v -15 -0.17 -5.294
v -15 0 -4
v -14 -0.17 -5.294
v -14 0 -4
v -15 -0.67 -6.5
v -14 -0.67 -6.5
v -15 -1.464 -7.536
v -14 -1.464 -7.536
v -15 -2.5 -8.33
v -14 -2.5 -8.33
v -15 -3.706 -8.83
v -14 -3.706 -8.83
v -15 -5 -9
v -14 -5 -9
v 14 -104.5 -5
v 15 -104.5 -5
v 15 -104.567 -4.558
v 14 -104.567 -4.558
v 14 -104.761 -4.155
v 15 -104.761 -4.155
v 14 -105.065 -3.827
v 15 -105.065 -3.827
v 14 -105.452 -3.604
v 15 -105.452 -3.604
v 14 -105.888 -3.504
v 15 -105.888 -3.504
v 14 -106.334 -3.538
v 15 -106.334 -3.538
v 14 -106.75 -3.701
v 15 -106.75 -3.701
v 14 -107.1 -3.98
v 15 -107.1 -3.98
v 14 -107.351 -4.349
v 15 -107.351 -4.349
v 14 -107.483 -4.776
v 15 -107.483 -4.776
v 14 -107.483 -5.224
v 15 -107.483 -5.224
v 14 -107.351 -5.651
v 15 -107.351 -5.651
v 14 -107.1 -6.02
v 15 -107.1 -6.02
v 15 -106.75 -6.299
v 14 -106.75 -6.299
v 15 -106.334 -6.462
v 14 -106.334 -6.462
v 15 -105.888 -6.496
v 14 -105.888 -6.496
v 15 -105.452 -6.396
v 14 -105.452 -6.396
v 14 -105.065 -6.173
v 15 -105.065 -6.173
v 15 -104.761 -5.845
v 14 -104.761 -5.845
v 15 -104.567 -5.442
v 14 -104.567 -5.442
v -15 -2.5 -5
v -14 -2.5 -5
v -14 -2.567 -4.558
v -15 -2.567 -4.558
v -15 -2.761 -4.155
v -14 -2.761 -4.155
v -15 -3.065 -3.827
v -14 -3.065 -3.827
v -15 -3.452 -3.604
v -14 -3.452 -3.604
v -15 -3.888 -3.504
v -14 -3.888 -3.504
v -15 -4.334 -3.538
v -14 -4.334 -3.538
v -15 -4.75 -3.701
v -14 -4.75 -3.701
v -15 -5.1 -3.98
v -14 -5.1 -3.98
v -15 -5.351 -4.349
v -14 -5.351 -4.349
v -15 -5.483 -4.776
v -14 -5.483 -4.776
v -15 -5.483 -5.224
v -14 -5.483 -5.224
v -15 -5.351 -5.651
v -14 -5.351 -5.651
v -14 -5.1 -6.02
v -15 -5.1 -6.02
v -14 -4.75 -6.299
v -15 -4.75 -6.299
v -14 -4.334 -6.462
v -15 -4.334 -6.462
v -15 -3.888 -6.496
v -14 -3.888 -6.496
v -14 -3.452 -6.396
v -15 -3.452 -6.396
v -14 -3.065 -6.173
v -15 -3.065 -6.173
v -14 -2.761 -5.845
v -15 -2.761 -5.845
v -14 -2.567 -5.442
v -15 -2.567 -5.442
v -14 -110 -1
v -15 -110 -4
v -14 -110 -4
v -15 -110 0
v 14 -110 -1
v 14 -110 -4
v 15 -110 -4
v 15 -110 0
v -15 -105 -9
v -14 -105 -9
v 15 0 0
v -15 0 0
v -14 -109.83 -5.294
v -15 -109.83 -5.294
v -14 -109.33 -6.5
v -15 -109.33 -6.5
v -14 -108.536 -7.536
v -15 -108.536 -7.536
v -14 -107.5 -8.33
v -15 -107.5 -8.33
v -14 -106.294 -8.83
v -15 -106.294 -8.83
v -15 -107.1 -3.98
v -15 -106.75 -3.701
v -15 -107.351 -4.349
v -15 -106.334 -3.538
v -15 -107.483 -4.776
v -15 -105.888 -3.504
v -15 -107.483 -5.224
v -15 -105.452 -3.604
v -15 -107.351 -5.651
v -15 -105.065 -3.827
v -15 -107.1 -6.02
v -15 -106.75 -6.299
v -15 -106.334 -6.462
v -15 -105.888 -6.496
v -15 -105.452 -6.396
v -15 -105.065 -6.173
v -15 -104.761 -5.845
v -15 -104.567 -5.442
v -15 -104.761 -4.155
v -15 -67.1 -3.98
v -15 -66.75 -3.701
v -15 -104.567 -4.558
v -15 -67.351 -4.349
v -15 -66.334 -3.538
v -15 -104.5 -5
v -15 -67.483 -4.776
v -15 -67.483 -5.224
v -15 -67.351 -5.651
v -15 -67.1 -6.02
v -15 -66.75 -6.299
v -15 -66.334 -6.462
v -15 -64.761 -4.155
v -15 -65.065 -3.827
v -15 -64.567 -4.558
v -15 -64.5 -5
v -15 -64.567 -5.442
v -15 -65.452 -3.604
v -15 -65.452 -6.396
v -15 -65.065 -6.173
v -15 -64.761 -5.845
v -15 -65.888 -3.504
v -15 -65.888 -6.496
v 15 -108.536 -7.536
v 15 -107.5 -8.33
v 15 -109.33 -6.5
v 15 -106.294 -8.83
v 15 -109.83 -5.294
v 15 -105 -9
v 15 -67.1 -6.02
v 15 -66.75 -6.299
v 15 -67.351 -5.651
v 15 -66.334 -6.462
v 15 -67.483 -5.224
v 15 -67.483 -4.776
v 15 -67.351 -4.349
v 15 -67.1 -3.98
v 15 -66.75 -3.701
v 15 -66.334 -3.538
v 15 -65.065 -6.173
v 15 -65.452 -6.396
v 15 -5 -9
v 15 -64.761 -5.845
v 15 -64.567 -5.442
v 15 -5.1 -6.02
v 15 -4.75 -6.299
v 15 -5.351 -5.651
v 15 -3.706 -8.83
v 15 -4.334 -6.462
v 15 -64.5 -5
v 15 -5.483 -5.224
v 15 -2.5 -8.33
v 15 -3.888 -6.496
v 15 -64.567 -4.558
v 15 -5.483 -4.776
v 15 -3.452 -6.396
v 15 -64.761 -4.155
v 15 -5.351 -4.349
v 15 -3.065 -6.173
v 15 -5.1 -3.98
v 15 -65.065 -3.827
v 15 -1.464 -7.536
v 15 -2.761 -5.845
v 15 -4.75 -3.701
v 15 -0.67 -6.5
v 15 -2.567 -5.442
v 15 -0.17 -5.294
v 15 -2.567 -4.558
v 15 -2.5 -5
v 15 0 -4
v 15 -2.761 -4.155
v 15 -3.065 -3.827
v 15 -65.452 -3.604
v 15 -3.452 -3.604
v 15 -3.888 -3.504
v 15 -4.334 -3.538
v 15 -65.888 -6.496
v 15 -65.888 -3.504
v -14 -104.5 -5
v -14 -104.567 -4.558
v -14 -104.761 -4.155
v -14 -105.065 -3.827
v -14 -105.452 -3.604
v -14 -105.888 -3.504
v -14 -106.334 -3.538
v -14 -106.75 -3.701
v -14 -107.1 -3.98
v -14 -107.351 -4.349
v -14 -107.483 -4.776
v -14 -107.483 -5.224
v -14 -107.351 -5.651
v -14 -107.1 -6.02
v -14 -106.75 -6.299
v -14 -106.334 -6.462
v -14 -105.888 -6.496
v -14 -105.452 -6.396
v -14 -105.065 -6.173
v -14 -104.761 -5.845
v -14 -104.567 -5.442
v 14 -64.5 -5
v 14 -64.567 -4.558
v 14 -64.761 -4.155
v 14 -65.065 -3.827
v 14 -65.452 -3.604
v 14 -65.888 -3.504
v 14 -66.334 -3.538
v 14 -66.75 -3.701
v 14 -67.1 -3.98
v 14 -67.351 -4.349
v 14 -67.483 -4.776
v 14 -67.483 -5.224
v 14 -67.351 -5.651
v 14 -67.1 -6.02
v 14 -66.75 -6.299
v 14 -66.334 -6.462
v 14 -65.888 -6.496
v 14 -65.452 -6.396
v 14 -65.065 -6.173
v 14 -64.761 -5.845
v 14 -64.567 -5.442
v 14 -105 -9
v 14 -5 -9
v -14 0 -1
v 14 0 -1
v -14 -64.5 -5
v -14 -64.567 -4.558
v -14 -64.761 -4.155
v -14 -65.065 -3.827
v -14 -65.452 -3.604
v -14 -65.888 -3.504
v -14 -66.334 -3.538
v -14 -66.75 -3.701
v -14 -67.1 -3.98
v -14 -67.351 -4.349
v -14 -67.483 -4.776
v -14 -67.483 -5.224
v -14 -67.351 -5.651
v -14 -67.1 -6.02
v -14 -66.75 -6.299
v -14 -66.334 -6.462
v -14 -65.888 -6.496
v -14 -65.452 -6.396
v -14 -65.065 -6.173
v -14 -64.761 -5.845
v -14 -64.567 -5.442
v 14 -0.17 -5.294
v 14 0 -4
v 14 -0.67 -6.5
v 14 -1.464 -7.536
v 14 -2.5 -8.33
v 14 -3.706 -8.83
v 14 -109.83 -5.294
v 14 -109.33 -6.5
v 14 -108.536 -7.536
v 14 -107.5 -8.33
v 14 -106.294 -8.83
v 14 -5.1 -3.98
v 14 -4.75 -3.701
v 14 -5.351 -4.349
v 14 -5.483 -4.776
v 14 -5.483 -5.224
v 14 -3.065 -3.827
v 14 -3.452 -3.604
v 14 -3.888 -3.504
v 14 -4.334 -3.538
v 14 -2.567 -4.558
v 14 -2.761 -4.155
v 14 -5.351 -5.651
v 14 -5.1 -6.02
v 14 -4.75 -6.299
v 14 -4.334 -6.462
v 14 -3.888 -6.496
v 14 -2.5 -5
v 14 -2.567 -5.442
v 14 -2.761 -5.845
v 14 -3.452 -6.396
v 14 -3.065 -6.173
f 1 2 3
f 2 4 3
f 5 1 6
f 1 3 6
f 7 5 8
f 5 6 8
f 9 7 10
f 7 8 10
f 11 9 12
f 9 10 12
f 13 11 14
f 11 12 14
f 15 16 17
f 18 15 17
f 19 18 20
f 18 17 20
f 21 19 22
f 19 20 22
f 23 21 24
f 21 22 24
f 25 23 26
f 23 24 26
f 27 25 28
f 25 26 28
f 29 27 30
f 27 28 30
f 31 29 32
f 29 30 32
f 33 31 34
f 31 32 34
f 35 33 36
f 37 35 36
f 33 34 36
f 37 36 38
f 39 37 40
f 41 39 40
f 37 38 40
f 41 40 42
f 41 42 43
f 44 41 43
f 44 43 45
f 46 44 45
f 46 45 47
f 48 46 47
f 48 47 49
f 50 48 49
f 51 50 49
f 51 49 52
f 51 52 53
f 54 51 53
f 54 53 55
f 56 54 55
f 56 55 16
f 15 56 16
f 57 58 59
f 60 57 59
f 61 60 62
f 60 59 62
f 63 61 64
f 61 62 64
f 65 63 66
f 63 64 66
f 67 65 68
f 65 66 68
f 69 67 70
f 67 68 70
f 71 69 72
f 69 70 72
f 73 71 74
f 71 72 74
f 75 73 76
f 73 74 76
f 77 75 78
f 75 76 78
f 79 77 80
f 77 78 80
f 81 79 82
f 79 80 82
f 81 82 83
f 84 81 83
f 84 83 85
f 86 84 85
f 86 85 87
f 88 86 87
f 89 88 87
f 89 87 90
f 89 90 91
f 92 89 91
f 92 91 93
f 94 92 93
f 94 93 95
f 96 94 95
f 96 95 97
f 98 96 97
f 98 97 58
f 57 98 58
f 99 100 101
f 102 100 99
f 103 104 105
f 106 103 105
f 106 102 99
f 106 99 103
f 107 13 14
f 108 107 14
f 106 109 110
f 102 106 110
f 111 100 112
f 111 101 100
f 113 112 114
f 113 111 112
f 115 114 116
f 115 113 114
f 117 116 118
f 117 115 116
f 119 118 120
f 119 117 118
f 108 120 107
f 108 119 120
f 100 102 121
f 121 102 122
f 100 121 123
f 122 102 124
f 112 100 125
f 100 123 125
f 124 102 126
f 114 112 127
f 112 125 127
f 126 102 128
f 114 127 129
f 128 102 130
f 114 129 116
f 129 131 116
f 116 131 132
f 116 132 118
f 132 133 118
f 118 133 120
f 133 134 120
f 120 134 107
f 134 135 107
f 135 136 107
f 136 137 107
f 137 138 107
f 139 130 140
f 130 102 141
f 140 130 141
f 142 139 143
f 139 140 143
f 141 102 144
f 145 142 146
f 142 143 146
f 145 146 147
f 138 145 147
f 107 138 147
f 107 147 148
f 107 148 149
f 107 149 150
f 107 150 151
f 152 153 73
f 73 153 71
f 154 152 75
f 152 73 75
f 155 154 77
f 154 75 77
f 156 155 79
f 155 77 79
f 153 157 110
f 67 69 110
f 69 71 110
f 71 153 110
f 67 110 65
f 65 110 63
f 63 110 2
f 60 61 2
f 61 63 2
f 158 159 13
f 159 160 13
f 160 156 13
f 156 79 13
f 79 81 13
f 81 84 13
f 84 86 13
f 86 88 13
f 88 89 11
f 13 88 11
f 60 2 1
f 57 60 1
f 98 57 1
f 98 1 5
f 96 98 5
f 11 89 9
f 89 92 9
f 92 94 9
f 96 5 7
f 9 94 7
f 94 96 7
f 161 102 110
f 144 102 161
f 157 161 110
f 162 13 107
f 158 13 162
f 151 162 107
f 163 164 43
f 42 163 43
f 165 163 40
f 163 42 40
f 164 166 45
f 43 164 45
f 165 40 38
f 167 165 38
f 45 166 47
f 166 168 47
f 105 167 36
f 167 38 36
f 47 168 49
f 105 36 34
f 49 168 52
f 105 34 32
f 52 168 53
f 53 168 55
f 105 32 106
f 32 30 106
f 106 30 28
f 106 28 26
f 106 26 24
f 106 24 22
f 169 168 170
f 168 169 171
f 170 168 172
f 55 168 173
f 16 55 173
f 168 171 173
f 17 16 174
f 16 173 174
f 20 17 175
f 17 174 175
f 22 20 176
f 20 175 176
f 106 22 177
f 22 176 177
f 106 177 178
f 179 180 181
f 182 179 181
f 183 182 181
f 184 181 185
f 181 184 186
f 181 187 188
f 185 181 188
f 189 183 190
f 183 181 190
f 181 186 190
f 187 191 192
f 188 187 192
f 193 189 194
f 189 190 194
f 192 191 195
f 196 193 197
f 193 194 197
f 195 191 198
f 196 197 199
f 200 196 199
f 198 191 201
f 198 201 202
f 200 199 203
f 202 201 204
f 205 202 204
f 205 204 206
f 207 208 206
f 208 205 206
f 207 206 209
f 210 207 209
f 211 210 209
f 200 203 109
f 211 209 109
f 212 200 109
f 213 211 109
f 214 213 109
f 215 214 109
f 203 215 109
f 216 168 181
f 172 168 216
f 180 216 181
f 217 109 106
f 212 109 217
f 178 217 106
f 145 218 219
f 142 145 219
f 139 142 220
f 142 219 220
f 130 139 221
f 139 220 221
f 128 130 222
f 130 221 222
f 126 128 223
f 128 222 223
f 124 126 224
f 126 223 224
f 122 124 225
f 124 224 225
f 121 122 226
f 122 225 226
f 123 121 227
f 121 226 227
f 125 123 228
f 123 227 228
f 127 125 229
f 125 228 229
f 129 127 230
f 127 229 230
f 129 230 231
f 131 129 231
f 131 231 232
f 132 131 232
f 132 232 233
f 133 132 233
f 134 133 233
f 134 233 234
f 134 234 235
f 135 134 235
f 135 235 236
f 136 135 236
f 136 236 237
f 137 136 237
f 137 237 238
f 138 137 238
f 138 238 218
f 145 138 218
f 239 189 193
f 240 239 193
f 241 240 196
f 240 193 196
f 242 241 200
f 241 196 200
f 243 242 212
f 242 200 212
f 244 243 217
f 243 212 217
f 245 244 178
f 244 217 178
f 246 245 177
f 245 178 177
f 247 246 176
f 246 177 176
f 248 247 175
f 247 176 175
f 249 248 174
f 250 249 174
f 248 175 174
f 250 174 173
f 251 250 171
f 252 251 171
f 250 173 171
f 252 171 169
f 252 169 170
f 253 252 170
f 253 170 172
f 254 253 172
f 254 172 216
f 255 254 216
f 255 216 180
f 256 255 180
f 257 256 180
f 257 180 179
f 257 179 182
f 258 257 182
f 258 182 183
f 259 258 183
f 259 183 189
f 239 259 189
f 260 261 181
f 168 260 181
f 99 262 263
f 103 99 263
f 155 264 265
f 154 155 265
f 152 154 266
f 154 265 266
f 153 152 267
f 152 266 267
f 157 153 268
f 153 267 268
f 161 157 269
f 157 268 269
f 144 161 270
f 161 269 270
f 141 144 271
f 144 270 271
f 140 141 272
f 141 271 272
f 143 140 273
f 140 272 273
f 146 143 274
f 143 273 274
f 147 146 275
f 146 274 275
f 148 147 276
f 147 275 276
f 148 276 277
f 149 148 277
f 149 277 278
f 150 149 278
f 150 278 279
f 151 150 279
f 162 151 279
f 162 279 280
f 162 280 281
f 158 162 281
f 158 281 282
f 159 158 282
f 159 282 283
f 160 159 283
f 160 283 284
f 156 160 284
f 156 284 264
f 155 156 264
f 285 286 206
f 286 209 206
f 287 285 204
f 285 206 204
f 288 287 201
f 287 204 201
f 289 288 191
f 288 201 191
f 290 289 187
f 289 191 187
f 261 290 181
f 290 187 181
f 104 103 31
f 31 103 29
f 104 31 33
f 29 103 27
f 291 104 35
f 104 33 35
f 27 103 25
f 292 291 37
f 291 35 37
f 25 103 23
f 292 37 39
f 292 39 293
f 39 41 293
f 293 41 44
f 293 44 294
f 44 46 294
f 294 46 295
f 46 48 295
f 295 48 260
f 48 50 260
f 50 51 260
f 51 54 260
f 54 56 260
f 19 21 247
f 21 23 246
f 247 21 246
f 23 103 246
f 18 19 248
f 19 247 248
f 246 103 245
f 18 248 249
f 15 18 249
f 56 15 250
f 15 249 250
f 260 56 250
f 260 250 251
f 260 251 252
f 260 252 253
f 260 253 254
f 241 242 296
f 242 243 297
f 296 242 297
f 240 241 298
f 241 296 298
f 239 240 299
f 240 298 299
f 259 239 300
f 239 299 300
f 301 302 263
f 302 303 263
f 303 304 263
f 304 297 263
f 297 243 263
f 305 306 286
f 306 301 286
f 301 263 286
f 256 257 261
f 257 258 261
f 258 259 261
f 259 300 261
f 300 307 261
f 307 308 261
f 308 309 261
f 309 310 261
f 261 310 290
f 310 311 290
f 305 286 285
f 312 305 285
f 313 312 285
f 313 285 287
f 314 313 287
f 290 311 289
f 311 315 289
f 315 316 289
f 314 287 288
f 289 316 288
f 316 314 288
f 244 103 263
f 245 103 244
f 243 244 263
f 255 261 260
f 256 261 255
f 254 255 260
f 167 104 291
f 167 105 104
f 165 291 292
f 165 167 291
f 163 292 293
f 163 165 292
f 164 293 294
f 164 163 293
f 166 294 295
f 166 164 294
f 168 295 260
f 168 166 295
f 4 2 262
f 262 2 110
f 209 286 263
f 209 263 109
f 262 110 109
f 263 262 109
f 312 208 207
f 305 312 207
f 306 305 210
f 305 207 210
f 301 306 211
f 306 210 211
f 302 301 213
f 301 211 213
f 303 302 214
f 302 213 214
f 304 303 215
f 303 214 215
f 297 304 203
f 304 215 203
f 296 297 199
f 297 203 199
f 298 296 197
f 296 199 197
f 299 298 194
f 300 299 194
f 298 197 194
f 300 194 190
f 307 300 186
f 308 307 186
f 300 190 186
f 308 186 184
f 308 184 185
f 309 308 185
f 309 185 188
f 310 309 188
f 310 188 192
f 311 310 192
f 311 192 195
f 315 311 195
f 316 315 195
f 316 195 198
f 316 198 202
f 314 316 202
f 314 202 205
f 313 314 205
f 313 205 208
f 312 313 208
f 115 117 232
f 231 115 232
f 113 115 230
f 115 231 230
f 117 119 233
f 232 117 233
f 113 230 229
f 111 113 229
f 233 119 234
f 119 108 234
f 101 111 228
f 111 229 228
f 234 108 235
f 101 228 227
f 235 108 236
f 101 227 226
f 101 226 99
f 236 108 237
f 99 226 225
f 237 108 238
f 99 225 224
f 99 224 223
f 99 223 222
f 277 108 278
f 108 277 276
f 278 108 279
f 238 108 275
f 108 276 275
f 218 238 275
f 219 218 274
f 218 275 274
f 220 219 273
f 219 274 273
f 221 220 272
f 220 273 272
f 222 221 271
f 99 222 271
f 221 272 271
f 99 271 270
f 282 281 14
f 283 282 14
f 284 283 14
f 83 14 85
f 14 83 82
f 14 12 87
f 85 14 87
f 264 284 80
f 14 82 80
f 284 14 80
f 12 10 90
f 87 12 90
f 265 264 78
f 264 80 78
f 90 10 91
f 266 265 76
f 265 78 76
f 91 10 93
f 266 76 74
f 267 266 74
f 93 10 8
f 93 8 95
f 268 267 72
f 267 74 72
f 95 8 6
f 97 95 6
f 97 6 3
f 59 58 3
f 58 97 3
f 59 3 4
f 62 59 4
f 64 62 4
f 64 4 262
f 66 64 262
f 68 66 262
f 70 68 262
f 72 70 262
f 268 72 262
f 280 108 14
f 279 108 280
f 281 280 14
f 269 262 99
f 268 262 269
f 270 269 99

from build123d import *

# Parameters (mm, degrees)
F1_DEPTH = 110
F2_R     = 1.5
F3_DEPTH = 35
F4_R     = 5


with BuildPart() as f1:
    # F0 (on Front) → F1 (new body)
    with BuildSketch(Plane.XZ):
        Polygon((15, 0), (-15, 0), (-15, -9), (-14, -9), (-14, -1), (14, -1), (14, -9), (15, -9), align=None)
    extrude(amount=F1_DEPTH)

    # F2 (on face) → F3 (cut)
    with BuildSketch(Plane.YZ.offset(15)):
        with Locations((-106, -5)):
            Circle(F2_R)
        with Locations((-66, -5)):
            Circle(F2_R)
        with Locations((-4, -5)):
            Circle(F2_R)
    extrude(amount=-F3_DEPTH, mode=Mode.SUBTRACT)

    # F4
    f4_edges = [f1.edges().sort_by_distance(p)[0] for p in [
        (14.5, -110, -9),
        (-14.5, -110, -9),
        (14.5, 0, -9),
        (-14.5, 0, -9),
    ]]
    fillet(f4_edges, radius=F4_R)


solid = f1.part
